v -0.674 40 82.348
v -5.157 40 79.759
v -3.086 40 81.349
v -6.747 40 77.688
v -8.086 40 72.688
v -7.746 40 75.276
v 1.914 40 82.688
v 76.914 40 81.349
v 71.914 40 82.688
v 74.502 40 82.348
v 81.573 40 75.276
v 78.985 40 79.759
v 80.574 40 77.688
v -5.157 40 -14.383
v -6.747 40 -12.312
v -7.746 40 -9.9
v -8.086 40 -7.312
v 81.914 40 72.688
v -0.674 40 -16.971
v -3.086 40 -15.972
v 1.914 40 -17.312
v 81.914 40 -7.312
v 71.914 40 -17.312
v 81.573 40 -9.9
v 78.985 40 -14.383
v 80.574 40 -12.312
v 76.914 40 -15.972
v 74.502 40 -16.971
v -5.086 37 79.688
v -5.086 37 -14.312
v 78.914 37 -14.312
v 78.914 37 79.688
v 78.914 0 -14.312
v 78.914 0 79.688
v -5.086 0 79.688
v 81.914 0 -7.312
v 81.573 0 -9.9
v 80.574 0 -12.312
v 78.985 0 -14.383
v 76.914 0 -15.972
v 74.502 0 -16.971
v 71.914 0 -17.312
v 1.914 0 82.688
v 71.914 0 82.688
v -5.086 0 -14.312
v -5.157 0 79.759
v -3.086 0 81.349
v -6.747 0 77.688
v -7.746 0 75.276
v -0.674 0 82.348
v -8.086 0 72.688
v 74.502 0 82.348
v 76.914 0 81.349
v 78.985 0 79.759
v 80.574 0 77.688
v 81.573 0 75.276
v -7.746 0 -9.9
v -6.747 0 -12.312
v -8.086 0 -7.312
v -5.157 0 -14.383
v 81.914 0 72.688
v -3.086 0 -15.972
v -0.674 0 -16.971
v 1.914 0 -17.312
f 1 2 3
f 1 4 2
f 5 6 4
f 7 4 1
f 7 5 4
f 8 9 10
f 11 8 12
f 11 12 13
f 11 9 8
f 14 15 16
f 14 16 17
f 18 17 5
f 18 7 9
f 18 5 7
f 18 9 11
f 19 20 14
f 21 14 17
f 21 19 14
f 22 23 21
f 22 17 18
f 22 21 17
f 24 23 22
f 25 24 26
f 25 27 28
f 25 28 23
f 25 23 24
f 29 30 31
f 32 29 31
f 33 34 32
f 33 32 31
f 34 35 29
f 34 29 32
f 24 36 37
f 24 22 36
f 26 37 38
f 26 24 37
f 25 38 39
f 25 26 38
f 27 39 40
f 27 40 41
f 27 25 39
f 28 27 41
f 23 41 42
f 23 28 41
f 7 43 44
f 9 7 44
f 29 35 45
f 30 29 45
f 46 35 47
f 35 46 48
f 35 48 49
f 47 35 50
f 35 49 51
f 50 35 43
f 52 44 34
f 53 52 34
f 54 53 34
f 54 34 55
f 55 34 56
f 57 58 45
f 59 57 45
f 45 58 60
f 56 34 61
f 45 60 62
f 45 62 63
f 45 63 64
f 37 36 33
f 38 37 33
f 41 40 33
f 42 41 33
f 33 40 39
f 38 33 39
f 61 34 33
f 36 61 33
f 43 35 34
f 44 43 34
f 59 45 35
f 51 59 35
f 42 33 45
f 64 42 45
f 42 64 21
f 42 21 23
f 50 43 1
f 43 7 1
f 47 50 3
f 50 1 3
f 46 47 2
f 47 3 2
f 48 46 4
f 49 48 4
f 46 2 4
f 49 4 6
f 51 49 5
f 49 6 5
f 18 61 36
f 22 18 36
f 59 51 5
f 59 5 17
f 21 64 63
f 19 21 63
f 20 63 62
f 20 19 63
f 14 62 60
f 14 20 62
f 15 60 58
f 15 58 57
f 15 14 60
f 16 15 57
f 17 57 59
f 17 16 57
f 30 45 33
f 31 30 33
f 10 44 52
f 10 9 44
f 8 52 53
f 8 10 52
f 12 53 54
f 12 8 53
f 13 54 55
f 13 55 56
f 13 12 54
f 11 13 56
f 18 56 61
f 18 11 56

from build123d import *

# Parameters (mm, degrees)
SKETCH1_W           = 90
SKETCH1_H           = 100
BOSS_EXTRUDE1_DEPTH = 40
SHELL1_T            = -3
FILLET1_R           = 10
FILLET2_R           = 10
FILLET3_R           = 10
FILLET4_R           = 10


with BuildPart() as part:
    # Sketch1 → Boss-Extrude1 (new body)
    with BuildSketch(Plane(origin=(0, 0, 0), x_dir=(1, 0, 0), z_dir=(0, 1, 0))):
        with Locations((36.913730494, -32.688282622)):
            Rectangle(SKETCH1_W, SKETCH1_H)
    extrude(amount=BOSS_EXTRUDE1_DEPTH)

    # Shell1
    shell1_openings = [part.faces().sort_by_distance(p)[0] for p in [
        (36.913730494, 0, 32.688282622),
    ]]
    offset(amount=SHELL1_T, openings=shell1_openings, kind=Kind.INTERSECTION)

    # Fillet1
    fillet1_edges = [part.edges().sort_by_distance(p)[0] for p in [
        (81.913730494, 20, 82.688282622),
    ]]
    fillet(fillet1_edges, radius=FILLET1_R)

    # Fillet2
    fillet2_edges = [part.edges().sort_by_distance(p)[0] for p in [
        (-8.086269506, 20, 82.688282622),
    ]]
    fillet(fillet2_edges, radius=FILLET2_R)

    # Fillet3
    fillet3_edges = [part.edges().sort_by_distance(p)[0] for p in [
        (81.913730494, 20, -17.311717378),
    ]]
    fillet(fillet3_edges, radius=FILLET3_R)

    # Fillet4
    fillet4_edges = [part.edges().sort_by_distance(p)[0] for p in [
        (-8.086269506, 20, -17.311717378),
    ]]
    fillet(fillet4_edges, radius=FILLET4_R)


solid = part.part
